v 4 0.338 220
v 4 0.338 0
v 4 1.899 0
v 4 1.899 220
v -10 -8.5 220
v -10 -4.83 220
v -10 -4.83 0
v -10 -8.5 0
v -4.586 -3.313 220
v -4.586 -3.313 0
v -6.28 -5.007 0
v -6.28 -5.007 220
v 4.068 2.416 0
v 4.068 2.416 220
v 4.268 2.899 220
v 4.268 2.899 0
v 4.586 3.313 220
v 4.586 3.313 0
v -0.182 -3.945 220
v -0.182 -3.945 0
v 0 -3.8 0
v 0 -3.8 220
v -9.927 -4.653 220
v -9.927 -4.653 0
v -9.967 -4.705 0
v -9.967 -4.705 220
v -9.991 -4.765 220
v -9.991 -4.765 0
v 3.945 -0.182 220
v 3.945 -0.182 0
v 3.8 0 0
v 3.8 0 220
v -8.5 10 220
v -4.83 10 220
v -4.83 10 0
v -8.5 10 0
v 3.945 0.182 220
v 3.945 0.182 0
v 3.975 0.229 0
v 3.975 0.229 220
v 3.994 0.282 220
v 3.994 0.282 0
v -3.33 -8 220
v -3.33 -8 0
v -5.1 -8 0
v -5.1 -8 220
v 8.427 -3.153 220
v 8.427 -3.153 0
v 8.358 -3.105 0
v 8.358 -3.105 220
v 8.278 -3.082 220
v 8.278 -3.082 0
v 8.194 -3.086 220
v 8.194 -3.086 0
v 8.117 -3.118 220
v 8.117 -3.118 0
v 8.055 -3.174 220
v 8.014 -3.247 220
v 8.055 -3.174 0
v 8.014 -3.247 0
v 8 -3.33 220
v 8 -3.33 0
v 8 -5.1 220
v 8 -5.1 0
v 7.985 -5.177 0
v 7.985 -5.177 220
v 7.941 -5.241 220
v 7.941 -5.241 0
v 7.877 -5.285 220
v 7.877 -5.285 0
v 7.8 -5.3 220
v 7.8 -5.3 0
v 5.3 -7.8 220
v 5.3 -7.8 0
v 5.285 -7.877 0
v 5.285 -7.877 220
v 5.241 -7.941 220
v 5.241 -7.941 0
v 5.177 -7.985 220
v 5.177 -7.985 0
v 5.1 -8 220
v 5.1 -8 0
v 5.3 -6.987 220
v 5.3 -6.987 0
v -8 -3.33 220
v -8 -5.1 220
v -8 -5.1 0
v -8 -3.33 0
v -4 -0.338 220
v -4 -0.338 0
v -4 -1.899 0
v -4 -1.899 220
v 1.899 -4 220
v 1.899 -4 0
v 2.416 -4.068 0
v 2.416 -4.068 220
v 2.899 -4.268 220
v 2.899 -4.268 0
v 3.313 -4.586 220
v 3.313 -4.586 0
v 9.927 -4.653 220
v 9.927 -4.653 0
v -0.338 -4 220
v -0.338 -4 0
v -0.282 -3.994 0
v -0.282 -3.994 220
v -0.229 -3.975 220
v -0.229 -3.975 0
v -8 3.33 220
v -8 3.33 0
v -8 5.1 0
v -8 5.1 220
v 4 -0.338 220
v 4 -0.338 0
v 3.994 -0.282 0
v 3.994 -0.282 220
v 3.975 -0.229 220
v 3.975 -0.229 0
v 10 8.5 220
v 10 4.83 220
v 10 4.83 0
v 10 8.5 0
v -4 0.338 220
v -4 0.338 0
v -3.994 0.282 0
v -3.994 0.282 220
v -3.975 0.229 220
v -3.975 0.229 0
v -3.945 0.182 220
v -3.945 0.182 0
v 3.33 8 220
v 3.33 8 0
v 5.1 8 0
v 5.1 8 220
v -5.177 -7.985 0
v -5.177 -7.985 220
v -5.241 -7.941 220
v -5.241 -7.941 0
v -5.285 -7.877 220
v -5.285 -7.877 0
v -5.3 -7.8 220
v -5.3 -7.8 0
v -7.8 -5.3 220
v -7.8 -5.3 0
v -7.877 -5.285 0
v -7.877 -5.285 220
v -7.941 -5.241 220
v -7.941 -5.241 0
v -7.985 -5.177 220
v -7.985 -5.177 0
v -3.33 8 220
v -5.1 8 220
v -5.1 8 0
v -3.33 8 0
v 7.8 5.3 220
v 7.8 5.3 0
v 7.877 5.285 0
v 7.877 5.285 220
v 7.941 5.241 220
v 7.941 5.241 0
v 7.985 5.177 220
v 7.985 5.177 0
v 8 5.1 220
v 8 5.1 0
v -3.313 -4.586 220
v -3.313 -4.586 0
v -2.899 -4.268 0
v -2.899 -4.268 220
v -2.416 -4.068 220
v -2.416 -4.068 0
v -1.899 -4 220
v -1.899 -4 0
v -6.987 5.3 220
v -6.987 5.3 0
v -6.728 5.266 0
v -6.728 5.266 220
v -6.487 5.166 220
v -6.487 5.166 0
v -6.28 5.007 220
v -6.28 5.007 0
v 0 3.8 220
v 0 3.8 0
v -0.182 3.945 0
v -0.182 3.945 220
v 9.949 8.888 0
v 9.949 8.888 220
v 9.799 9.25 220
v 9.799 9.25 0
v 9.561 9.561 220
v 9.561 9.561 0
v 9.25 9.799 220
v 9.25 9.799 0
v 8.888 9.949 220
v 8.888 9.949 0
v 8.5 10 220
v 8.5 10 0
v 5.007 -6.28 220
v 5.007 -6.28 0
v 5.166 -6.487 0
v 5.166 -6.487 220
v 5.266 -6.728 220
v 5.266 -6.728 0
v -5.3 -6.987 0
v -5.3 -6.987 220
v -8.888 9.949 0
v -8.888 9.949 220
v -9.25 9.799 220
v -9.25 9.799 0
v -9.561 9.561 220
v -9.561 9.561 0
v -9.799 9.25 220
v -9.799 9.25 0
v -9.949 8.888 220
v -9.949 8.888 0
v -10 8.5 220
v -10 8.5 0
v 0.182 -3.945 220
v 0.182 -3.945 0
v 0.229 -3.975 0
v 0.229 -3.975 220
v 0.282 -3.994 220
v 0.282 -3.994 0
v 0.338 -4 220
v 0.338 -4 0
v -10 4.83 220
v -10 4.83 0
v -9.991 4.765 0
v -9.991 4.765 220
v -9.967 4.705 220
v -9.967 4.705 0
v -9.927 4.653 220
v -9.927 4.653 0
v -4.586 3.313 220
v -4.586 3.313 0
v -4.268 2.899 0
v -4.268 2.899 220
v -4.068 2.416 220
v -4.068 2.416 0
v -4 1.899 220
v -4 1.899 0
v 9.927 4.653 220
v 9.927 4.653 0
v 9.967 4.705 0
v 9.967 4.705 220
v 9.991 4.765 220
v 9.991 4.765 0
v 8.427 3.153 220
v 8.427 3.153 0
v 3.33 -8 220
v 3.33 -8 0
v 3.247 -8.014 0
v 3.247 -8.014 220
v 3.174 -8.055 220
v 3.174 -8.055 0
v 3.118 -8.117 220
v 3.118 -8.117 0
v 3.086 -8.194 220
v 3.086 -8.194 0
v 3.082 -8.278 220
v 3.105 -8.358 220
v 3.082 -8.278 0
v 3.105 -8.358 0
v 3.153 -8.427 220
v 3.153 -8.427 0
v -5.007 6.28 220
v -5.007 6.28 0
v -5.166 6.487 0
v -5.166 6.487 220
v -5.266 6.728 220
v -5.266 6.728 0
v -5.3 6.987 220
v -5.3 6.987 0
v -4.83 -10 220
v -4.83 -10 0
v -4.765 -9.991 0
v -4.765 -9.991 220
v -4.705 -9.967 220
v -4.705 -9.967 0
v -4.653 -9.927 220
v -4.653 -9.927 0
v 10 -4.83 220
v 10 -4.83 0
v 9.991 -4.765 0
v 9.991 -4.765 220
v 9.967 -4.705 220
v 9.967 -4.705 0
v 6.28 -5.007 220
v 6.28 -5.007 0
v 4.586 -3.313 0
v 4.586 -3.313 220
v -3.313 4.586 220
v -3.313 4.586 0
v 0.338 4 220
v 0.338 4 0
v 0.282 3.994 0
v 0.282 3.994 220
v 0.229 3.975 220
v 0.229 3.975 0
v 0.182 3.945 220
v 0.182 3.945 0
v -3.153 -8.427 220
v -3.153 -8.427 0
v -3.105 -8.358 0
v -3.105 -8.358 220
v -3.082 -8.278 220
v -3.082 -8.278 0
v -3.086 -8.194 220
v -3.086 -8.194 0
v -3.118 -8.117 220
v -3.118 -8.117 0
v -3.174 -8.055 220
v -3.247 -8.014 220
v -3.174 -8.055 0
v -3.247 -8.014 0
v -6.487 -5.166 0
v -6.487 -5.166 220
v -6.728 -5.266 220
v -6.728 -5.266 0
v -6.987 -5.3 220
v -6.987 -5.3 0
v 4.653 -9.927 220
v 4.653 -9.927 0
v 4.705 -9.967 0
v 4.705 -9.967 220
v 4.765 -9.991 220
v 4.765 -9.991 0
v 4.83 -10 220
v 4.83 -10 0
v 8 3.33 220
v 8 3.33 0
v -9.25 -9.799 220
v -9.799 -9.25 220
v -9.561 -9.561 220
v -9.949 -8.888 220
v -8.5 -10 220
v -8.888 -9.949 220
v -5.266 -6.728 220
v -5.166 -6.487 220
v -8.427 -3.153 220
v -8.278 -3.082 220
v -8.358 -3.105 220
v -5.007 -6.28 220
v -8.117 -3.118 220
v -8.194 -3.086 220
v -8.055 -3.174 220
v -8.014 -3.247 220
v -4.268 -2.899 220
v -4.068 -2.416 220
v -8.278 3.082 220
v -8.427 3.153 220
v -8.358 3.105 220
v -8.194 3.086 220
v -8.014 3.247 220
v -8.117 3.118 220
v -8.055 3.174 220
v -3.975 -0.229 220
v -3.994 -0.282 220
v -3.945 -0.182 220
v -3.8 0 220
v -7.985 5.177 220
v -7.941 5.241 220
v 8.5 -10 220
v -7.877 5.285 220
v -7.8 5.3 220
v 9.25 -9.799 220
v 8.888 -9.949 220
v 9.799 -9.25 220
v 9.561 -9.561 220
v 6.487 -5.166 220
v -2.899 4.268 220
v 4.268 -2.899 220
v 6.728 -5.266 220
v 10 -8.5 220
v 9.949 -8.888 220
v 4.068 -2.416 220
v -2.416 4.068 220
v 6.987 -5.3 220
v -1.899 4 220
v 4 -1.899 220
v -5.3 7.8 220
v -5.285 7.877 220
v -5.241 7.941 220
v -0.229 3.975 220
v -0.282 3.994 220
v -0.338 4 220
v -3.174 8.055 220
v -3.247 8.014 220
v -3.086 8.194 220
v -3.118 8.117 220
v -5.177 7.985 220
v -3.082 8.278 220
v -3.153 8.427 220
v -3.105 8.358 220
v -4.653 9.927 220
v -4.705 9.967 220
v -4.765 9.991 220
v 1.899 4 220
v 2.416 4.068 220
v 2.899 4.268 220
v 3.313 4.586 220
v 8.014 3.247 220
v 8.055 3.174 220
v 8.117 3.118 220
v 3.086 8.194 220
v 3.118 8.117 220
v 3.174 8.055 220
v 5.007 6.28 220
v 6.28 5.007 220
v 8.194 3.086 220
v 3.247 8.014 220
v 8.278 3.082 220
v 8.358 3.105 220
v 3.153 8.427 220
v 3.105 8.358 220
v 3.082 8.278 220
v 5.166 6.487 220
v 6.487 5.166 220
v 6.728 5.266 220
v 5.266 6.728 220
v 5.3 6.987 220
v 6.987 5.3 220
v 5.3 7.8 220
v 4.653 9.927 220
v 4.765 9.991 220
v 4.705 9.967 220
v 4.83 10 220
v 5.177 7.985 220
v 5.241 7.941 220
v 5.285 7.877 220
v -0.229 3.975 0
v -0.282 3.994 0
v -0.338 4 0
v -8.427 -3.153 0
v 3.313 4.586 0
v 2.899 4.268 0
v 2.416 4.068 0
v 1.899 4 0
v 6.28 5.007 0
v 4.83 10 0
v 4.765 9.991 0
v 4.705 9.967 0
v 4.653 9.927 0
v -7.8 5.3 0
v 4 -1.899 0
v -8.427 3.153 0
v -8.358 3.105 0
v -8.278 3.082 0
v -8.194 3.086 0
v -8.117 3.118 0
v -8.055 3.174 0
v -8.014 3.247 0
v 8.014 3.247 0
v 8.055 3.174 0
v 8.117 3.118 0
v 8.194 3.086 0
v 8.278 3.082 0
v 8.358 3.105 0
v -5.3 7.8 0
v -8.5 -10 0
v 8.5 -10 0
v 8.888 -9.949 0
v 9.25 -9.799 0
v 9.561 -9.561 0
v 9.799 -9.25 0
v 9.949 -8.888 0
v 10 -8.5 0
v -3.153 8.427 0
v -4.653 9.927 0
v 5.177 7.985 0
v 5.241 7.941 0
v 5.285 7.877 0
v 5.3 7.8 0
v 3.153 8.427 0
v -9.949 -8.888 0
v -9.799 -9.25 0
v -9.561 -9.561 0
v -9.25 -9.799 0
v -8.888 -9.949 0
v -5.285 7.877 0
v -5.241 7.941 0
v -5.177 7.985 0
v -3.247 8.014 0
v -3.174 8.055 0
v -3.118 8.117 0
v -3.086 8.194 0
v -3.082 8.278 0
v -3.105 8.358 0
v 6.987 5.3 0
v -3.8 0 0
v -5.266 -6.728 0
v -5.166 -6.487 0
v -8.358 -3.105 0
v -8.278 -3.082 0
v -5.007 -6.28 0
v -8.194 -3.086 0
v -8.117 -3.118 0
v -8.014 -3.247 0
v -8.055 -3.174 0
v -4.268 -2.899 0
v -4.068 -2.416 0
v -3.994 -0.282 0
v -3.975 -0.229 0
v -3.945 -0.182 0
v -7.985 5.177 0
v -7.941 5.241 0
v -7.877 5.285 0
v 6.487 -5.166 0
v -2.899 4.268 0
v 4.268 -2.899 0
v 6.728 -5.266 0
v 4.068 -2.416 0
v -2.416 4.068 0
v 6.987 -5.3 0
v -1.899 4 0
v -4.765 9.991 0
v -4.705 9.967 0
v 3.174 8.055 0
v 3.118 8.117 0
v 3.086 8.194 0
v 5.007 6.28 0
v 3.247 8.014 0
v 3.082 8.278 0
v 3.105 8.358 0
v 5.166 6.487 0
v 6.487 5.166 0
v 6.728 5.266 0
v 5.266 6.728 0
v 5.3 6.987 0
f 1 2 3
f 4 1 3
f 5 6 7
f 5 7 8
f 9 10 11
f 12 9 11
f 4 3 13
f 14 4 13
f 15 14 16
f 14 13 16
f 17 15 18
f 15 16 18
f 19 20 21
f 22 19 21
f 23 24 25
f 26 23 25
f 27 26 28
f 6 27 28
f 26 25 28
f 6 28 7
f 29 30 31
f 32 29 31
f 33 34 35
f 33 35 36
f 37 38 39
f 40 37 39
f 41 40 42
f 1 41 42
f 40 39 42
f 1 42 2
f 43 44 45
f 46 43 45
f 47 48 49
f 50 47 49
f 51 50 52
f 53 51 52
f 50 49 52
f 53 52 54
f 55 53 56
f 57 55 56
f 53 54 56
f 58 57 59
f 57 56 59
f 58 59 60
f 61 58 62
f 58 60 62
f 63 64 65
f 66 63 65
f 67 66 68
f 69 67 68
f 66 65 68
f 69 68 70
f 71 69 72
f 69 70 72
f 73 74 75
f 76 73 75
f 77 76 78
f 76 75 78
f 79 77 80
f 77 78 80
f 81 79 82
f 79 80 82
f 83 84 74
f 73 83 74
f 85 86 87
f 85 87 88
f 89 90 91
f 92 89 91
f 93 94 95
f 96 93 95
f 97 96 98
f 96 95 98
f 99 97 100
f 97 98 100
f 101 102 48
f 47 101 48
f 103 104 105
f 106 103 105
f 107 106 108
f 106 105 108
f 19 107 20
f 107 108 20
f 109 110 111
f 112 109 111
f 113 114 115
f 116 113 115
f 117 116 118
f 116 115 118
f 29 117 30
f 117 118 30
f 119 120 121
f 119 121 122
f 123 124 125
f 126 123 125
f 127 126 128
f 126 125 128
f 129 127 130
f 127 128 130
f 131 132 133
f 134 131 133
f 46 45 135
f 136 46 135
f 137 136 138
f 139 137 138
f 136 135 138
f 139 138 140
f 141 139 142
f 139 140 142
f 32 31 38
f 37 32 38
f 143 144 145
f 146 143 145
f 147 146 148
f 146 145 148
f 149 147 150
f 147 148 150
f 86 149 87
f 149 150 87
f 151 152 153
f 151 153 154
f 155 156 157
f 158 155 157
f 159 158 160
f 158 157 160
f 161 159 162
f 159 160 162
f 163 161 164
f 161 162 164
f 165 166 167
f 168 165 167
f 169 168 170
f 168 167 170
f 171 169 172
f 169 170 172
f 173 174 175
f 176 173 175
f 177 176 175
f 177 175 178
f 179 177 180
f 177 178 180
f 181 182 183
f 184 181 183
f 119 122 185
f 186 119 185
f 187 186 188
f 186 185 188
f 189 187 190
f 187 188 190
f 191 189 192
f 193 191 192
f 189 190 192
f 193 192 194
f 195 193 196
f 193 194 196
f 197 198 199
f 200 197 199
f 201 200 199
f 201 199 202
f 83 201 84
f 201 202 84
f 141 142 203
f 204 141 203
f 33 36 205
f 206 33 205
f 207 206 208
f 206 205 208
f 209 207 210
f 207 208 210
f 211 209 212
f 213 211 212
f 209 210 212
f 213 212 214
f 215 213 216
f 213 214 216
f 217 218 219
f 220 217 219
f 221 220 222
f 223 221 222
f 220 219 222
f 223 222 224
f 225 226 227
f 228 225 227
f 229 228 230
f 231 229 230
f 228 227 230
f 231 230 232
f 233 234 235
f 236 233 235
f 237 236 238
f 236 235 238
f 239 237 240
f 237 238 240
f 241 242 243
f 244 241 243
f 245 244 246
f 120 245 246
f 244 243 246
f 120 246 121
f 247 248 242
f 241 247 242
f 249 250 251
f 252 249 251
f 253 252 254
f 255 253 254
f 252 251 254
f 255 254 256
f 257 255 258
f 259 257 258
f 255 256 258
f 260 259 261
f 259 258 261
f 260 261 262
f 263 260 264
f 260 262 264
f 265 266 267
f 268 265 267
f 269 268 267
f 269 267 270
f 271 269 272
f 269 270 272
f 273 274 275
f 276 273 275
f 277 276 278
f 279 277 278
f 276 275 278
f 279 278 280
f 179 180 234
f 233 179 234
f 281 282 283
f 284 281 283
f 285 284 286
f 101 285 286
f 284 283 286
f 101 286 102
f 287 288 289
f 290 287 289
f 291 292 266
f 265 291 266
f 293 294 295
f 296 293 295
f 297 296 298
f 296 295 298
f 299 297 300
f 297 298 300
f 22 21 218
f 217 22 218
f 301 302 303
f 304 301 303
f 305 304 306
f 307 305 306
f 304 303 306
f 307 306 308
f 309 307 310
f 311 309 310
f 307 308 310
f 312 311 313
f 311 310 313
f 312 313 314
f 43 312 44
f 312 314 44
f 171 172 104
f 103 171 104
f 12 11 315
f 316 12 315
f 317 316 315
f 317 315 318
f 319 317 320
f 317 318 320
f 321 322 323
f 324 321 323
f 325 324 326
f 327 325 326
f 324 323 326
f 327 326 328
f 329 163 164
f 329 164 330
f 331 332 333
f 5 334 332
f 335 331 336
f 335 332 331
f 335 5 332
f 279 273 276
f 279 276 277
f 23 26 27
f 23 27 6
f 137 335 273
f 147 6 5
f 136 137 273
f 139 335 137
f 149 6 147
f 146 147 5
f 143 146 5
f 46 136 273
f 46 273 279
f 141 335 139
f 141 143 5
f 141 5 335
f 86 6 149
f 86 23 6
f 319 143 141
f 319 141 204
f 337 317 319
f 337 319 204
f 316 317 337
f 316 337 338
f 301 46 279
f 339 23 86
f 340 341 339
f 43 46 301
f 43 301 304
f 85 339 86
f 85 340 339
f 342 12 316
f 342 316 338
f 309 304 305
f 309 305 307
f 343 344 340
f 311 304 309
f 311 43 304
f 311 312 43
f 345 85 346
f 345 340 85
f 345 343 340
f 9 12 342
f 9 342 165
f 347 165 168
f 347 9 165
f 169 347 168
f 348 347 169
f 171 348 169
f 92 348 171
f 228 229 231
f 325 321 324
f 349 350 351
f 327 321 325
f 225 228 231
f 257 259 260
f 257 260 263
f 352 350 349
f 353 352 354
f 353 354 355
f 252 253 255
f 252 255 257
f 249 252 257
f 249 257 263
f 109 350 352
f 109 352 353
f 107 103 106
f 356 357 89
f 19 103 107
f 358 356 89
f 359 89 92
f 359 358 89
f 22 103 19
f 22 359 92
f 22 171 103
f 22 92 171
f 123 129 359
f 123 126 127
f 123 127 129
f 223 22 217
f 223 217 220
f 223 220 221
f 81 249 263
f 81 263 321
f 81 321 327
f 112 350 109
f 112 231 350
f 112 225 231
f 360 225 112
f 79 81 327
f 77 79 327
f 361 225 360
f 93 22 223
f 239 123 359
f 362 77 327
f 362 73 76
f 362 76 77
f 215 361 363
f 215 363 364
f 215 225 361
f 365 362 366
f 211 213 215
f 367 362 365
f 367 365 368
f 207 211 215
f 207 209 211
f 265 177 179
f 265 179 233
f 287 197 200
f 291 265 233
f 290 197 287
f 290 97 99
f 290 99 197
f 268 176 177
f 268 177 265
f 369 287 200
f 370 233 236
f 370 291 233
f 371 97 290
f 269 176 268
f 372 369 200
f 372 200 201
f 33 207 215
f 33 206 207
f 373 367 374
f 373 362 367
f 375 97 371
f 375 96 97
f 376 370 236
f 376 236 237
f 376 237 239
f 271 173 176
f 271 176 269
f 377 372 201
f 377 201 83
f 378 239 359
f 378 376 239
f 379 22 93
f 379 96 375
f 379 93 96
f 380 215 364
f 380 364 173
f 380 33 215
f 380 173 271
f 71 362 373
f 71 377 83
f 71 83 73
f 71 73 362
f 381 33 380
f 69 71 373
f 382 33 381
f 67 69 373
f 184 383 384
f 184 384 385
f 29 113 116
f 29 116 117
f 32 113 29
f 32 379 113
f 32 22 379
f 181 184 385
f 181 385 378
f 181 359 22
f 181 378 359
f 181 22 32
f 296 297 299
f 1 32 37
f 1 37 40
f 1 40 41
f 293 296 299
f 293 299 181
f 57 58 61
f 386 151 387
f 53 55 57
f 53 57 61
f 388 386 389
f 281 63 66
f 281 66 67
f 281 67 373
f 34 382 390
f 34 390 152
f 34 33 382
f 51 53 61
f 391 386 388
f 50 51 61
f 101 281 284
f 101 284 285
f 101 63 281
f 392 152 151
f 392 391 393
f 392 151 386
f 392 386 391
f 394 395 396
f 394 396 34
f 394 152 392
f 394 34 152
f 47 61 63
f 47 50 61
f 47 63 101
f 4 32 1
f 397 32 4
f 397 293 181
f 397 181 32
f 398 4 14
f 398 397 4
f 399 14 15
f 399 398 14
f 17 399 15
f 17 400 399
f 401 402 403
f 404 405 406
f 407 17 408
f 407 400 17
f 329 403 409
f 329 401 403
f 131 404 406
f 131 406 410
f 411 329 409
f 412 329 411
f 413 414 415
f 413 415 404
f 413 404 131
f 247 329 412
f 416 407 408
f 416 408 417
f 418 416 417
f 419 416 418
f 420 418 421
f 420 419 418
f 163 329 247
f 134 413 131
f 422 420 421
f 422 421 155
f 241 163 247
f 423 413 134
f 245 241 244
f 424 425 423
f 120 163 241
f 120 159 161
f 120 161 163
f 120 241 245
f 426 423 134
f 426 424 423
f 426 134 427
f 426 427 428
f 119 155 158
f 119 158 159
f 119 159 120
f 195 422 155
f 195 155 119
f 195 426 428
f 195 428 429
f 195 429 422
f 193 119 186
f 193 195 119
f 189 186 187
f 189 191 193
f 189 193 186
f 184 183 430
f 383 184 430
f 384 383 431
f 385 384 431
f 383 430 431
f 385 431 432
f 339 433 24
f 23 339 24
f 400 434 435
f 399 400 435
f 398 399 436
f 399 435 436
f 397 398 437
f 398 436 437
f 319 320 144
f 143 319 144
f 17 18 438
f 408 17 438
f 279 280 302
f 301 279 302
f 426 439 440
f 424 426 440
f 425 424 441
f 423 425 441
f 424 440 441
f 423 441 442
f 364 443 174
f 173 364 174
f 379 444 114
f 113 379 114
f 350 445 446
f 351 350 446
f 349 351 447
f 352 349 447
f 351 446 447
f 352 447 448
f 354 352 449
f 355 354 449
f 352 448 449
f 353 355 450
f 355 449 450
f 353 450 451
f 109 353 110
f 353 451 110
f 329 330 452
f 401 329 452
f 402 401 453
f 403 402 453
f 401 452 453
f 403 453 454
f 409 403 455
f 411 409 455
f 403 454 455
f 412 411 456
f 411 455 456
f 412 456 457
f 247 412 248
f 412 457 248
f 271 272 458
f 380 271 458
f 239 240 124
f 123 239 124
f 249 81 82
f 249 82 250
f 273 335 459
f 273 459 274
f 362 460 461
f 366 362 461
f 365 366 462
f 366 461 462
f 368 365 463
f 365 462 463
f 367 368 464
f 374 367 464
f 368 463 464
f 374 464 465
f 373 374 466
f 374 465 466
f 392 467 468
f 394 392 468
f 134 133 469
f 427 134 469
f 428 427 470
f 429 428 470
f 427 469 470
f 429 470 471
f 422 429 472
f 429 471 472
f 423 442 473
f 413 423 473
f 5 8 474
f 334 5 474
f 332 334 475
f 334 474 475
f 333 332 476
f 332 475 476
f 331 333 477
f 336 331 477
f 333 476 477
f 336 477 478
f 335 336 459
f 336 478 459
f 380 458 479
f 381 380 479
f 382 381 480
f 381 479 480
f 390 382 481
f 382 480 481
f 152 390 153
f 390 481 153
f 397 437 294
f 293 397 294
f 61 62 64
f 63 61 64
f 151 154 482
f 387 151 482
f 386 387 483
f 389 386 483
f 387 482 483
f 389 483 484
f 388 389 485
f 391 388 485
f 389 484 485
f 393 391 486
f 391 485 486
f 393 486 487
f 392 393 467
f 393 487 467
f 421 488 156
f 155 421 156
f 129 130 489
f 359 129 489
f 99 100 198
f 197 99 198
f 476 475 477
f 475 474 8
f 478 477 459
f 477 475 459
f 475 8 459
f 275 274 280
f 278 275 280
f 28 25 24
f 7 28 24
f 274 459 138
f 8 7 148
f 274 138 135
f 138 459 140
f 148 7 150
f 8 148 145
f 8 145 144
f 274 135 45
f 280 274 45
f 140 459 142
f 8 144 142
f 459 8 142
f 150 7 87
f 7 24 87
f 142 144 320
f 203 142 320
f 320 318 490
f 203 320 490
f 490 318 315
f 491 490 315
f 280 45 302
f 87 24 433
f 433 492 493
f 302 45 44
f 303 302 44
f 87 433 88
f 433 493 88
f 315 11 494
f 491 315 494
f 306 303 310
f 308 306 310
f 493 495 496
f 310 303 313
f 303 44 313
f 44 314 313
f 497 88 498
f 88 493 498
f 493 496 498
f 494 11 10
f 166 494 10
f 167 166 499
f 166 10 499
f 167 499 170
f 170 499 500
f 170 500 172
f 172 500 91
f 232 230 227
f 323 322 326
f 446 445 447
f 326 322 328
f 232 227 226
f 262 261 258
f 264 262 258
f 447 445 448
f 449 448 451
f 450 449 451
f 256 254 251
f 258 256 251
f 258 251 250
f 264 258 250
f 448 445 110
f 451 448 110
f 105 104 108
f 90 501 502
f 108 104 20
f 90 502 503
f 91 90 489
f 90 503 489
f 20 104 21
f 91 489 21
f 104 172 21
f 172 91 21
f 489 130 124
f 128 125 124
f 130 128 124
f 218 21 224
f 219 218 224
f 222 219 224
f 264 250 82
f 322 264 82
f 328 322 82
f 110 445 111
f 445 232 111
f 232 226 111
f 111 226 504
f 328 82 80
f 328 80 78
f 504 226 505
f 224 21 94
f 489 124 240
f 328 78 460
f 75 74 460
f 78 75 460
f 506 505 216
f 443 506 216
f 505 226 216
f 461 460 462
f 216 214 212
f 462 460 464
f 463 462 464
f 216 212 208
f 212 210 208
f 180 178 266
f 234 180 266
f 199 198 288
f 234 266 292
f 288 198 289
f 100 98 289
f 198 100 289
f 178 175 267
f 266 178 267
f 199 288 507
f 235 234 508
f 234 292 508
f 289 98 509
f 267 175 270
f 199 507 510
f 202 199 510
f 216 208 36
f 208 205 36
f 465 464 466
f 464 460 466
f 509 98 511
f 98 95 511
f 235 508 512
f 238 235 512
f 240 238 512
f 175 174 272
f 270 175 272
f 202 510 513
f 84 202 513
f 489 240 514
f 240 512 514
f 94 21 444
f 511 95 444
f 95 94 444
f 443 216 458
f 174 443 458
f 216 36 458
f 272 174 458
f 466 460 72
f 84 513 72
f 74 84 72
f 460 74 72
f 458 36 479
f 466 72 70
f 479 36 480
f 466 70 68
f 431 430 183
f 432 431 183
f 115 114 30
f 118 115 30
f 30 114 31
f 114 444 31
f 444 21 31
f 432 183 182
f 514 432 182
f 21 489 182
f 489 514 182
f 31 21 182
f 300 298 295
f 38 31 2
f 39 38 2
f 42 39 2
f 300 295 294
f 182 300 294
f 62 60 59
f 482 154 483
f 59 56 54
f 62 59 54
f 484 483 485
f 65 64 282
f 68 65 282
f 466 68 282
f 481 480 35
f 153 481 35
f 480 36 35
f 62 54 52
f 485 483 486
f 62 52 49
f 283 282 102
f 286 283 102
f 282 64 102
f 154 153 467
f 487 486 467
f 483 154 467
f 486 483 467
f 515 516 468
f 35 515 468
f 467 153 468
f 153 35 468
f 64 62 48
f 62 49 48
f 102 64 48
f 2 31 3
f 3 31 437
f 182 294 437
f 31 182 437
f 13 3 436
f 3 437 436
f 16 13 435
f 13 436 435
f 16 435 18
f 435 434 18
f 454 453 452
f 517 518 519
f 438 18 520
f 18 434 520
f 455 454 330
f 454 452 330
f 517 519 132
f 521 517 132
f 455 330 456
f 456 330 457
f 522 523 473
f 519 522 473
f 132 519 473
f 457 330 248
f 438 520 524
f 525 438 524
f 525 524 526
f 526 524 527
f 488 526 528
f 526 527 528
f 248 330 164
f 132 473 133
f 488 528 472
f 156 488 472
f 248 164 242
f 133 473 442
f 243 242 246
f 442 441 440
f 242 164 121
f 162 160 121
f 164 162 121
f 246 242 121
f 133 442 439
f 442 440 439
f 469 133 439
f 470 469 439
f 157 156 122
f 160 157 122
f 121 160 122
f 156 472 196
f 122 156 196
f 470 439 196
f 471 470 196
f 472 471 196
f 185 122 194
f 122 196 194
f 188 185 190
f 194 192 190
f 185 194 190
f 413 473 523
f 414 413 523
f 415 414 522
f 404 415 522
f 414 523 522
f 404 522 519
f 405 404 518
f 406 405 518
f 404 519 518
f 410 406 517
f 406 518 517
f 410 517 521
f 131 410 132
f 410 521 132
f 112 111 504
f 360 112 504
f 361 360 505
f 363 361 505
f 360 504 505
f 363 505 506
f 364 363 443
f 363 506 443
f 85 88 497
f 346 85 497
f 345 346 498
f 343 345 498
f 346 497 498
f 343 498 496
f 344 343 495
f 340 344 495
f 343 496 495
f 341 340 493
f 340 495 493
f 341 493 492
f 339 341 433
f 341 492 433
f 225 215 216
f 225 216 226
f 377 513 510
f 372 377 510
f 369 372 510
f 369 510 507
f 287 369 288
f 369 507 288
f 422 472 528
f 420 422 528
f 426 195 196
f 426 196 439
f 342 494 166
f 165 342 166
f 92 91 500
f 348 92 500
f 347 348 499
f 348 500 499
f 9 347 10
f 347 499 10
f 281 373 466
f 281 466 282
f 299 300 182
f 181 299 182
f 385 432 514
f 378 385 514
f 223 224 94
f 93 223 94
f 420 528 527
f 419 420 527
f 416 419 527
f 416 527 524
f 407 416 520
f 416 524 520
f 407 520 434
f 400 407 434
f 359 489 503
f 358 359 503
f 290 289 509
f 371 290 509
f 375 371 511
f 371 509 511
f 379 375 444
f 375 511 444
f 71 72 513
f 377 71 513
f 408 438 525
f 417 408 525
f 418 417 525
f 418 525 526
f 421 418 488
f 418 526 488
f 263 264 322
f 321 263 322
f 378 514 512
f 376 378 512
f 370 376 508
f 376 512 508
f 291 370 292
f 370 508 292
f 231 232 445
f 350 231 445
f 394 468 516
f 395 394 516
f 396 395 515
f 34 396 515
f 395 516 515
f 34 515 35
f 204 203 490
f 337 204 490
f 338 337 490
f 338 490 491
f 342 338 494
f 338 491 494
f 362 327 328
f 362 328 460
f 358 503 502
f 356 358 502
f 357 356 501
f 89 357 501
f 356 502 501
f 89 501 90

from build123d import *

# Parameters (mm, degrees)
EXTRUDE_1_DEPTH = 220


# Read off the part's stored shape, not the designer's step: 222 Конструкционный профиль 20х20-1-surface1
with BuildPart() as part:
    # Эскиз1 → Бобышка-Вытянуть1 (new body)
    with BuildSketch(Plane.XY):
        with BuildLine():
            Line((-3.945217202, 0.181521503), (-3.8, 0))
            Line((-3.8, 0), (-3.945217202, -0.181521503))
            ThreePointArc((-3.945217202, -0.181521503), (-3.98590708, -0.254943529), (-4, -0.337695265))
            Line((-4, -0.337695265), (-4, -1.898780669))
            ThreePointArc((-4, -1.898780669), (-4.152240935, -2.664147534), (-4.585786438, -3.312994231))
            Line((-4.585786438, -3.312994231), (-6.279898987, -5.007106781))
            ThreePointArc((-6.279898987, -5.007106781), (-6.604322336, -5.223879533), (-6.987005769, -5.3))
            Line((-6.987005769, -5.3), (-7.8, -5.3))
            ThreePointArc((-7.8, -5.3), (-7.941421356, -5.241421356), (-8, -5.1))
            Line((-8, -5.1), (-8, -3.33))
            ThreePointArc((-8, -3.33), (-8.154329142, -3.099030117), (-8.426776695, -3.153223305))
            Line((-8.426776695, -3.153223305), (-9.926776695, -4.653223305))
            ThreePointArc((-9.926776695, -4.653223305), (-9.980969883, -4.734329142), (-10, -4.83))
            Line((-10, -4.83), (-10, -8.5))
            ThreePointArc((-10, -8.5), (-9.560660172, -9.560660172), (-8.5, -10))
            Line((-8.5, -10), (-4.83, -10))
            ThreePointArc((-4.83, -10), (-4.734329142, -9.980969883), (-4.653223305, -9.926776695))
            Line((-4.653223305, -9.926776695), (-3.153223305, -8.426776695))
            ThreePointArc((-3.153223305, -8.426776695), (-3.099030117, -8.154329142), (-3.33, -8))
            Line((-3.33, -8), (-5.1, -8))
            ThreePointArc((-5.1, -8), (-5.241421356, -7.941421356), (-5.3, -7.8))
            Line((-5.3, -7.8), (-5.3, -6.987005769))
            ThreePointArc((-5.3, -6.987005769), (-5.223879533, -6.604322336), (-5.007106781, -6.279898987))
            Line((-5.007106781, -6.279898987), (-3.312994231, -4.585786438))
            ThreePointArc((-3.312994231, -4.585786438), (-2.664147534, -4.152240935), (-1.898780669, -4))
            Line((-1.898780669, -4), (-0.337695265, -4))
            ThreePointArc((-0.337695265, -4), (-0.254943529, -3.98590708), (-0.181521503, -3.945217202))
            Line((-0.181521503, -3.945217202), (0, -3.8))
            Line((0, -3.8), (0.181521503, -3.945217202))
            ThreePointArc((0.181521503, -3.945217202), (0.254943529, -3.98590708), (0.337695265, -4))
            Line((0.337695265, -4), (1.898780669, -4))
            ThreePointArc((1.898780669, -4), (2.664147534, -4.152240935), (3.312994231, -4.585786438))
            Line((3.312994231, -4.585786438), (5.007106781, -6.279898987))
            ThreePointArc((5.007106781, -6.279898987), (5.223879533, -6.604322336), (5.3, -6.987005769))
            Line((5.3, -6.987005769), (5.3, -7.8))
            ThreePointArc((5.3, -7.8), (5.241421356, -7.941421356), (5.1, -8))
            Line((5.1, -8), (3.33, -8))
            ThreePointArc((3.33, -8), (3.099030117, -8.154329142), (3.153223305, -8.426776695))
            Line((3.153223305, -8.426776695), (4.653223305, -9.926776695))
            ThreePointArc((4.653223305, -9.926776695), (4.734329142, -9.980969883), (4.83, -10))
            Line((4.83, -10), (8.5, -10))
            ThreePointArc((8.5, -10), (9.560660172, -9.560660172), (10, -8.5))
            Line((10, -8.5), (10, -4.83))
            ThreePointArc((10, -4.83), (9.980969883, -4.734329142), (9.926776695, -4.653223305))
            Line((9.926776695, -4.653223305), (8.426776695, -3.153223305))
            ThreePointArc((8.426776695, -3.153223305), (8.154329142, -3.099030117), (8, -3.33))
            Line((8, -3.33), (8, -5.1))
            ThreePointArc((8, -5.1), (7.941421356, -5.241421356), (7.8, -5.3))
            Line((7.8, -5.3), (6.987005769, -5.3))
            ThreePointArc((6.987005769, -5.3), (6.604322336, -5.223879533), (6.279898987, -5.007106781))
            Line((6.279898987, -5.007106781), (4.585786438, -3.312994231))
            ThreePointArc((4.585786438, -3.312994231), (4.152240935, -2.664147534), (4, -1.898780669))
            Line((4, -1.898780669), (4, -0.337695265))
            ThreePointArc((4, -0.337695265), (3.98590708, -0.254943529), (3.945217202, -0.181521503))
            Line((3.945217202, -0.181521503), (3.8, 0))
            Line((3.8, 0), (3.945217202, 0.181521503))
            ThreePointArc((3.945217202, 0.181521503), (3.98590708, 0.254943529), (4, 0.337695265))
            Line((4, 0.337695265), (4, 1.898780669))
            ThreePointArc((4, 1.898780669), (4.152240935, 2.664147534), (4.585786438, 3.312994231))
            Line((4.585786438, 3.312994231), (6.279898987, 5.007106781))
            ThreePointArc((6.279898987, 5.007106781), (6.604322336, 5.223879533), (6.987005769, 5.3))
            Line((6.987005769, 5.3), (7.8, 5.3))
            ThreePointArc((7.8, 5.3), (7.941421356, 5.241421356), (8, 5.1))
            Line((8, 5.1), (8, 3.33))
            ThreePointArc((8, 3.33), (8.154329142, 3.099030117), (8.426776695, 3.153223305))
            Line((8.426776695, 3.153223305), (9.926776695, 4.653223305))
            ThreePointArc((9.926776695, 4.653223305), (9.980969883, 4.734329142), (10, 4.83))
            Line((10, 4.83), (10, 8.5))
            ThreePointArc((10, 8.5), (9.560660172, 9.560660172), (8.5, 10))
            Line((8.5, 10), (4.83, 10))
            ThreePointArc((4.83, 10), (4.734329142, 9.980969883), (4.653223305, 9.926776695))
            Line((4.653223305, 9.926776695), (3.153223305, 8.426776695))
            ThreePointArc((3.153223305, 8.426776695), (3.099030117, 8.154329142), (3.33, 8))
            Line((3.33, 8), (5.1, 8))
            ThreePointArc((5.1, 8), (5.241421356, 7.941421356), (5.3, 7.8))
            Line((5.3, 7.8), (5.3, 6.987005769))
            ThreePointArc((5.3, 6.987005769), (5.223879533, 6.604322336), (5.007106781, 6.279898987))
            Line((5.007106781, 6.279898987), (3.312994231, 4.585786438))
            ThreePointArc((3.312994231, 4.585786438), (2.664147534, 4.152240935), (1.898780669, 4))
            Line((1.898780669, 4), (0.337695265, 4))
            ThreePointArc((0.337695265, 4), (0.254943529, 3.98590708), (0.181521503, 3.945217202))
            Line((0.181521503, 3.945217202), (0, 3.8))
            Line((0, 3.8), (-0.181521503, 3.945217202))
            ThreePointArc((-0.181521503, 3.945217202), (-0.254943529, 3.98590708), (-0.337695265, 4))
            Line((-0.337695265, 4), (-1.898780669, 4))
            ThreePointArc((-1.898780669, 4), (-2.664147534, 4.152240935), (-3.312994231, 4.585786438))
            Line((-3.312994231, 4.585786438), (-5.007106781, 6.279898987))
            ThreePointArc((-5.007106781, 6.279898987), (-5.223879533, 6.604322336), (-5.3, 6.987005769))
            Line((-5.3, 6.987005769), (-5.3, 7.8))
            ThreePointArc((-5.3, 7.8), (-5.241421356, 7.941421356), (-5.1, 8))
            Line((-5.1, 8), (-3.33, 8))
            ThreePointArc((-3.33, 8), (-3.099030117, 8.154329142), (-3.153223305, 8.426776695))
            Line((-3.153223305, 8.426776695), (-4.653223305, 9.926776695))
            ThreePointArc((-4.653223305, 9.926776695), (-4.734329142, 9.980969883), (-4.83, 10))
            Line((-4.83, 10), (-8.5, 10))
            ThreePointArc((-8.5, 10), (-9.560660172, 9.560660172), (-10, 8.5))
            Line((-10, 8.5), (-10, 4.83))
            ThreePointArc((-10, 4.83), (-9.980969883, 4.734329142), (-9.926776695, 4.653223305))
            Line((-9.926776695, 4.653223305), (-8.426776695, 3.153223305))
            ThreePointArc((-8.426776695, 3.153223305), (-8.154329142, 3.099030117), (-8, 3.33))
            Line((-8, 3.33), (-8, 5.1))
            ThreePointArc((-8, 5.1), (-7.941421356, 5.241421356), (-7.8, 5.3))
            Line((-7.8, 5.3), (-6.987005769, 5.3))
            ThreePointArc((-6.987005769, 5.3), (-6.604322336, 5.223879533), (-6.279898987, 5.007106781))
            Line((-6.279898987, 5.007106781), (-4.585786438, 3.312994231))
            ThreePointArc((-4.585786438, 3.312994231), (-4.152240935, 2.664147534), (-4, 1.898780669))
            Line((-4, 1.898780669), (-4, 0.337695265))
            ThreePointArc((-4, 0.337695265), (-3.98590708, 0.254943529), (-3.945217202, 0.181521503))
        make_face()
    extrude(amount=EXTRUDE_1_DEPTH)


solid = part.part
